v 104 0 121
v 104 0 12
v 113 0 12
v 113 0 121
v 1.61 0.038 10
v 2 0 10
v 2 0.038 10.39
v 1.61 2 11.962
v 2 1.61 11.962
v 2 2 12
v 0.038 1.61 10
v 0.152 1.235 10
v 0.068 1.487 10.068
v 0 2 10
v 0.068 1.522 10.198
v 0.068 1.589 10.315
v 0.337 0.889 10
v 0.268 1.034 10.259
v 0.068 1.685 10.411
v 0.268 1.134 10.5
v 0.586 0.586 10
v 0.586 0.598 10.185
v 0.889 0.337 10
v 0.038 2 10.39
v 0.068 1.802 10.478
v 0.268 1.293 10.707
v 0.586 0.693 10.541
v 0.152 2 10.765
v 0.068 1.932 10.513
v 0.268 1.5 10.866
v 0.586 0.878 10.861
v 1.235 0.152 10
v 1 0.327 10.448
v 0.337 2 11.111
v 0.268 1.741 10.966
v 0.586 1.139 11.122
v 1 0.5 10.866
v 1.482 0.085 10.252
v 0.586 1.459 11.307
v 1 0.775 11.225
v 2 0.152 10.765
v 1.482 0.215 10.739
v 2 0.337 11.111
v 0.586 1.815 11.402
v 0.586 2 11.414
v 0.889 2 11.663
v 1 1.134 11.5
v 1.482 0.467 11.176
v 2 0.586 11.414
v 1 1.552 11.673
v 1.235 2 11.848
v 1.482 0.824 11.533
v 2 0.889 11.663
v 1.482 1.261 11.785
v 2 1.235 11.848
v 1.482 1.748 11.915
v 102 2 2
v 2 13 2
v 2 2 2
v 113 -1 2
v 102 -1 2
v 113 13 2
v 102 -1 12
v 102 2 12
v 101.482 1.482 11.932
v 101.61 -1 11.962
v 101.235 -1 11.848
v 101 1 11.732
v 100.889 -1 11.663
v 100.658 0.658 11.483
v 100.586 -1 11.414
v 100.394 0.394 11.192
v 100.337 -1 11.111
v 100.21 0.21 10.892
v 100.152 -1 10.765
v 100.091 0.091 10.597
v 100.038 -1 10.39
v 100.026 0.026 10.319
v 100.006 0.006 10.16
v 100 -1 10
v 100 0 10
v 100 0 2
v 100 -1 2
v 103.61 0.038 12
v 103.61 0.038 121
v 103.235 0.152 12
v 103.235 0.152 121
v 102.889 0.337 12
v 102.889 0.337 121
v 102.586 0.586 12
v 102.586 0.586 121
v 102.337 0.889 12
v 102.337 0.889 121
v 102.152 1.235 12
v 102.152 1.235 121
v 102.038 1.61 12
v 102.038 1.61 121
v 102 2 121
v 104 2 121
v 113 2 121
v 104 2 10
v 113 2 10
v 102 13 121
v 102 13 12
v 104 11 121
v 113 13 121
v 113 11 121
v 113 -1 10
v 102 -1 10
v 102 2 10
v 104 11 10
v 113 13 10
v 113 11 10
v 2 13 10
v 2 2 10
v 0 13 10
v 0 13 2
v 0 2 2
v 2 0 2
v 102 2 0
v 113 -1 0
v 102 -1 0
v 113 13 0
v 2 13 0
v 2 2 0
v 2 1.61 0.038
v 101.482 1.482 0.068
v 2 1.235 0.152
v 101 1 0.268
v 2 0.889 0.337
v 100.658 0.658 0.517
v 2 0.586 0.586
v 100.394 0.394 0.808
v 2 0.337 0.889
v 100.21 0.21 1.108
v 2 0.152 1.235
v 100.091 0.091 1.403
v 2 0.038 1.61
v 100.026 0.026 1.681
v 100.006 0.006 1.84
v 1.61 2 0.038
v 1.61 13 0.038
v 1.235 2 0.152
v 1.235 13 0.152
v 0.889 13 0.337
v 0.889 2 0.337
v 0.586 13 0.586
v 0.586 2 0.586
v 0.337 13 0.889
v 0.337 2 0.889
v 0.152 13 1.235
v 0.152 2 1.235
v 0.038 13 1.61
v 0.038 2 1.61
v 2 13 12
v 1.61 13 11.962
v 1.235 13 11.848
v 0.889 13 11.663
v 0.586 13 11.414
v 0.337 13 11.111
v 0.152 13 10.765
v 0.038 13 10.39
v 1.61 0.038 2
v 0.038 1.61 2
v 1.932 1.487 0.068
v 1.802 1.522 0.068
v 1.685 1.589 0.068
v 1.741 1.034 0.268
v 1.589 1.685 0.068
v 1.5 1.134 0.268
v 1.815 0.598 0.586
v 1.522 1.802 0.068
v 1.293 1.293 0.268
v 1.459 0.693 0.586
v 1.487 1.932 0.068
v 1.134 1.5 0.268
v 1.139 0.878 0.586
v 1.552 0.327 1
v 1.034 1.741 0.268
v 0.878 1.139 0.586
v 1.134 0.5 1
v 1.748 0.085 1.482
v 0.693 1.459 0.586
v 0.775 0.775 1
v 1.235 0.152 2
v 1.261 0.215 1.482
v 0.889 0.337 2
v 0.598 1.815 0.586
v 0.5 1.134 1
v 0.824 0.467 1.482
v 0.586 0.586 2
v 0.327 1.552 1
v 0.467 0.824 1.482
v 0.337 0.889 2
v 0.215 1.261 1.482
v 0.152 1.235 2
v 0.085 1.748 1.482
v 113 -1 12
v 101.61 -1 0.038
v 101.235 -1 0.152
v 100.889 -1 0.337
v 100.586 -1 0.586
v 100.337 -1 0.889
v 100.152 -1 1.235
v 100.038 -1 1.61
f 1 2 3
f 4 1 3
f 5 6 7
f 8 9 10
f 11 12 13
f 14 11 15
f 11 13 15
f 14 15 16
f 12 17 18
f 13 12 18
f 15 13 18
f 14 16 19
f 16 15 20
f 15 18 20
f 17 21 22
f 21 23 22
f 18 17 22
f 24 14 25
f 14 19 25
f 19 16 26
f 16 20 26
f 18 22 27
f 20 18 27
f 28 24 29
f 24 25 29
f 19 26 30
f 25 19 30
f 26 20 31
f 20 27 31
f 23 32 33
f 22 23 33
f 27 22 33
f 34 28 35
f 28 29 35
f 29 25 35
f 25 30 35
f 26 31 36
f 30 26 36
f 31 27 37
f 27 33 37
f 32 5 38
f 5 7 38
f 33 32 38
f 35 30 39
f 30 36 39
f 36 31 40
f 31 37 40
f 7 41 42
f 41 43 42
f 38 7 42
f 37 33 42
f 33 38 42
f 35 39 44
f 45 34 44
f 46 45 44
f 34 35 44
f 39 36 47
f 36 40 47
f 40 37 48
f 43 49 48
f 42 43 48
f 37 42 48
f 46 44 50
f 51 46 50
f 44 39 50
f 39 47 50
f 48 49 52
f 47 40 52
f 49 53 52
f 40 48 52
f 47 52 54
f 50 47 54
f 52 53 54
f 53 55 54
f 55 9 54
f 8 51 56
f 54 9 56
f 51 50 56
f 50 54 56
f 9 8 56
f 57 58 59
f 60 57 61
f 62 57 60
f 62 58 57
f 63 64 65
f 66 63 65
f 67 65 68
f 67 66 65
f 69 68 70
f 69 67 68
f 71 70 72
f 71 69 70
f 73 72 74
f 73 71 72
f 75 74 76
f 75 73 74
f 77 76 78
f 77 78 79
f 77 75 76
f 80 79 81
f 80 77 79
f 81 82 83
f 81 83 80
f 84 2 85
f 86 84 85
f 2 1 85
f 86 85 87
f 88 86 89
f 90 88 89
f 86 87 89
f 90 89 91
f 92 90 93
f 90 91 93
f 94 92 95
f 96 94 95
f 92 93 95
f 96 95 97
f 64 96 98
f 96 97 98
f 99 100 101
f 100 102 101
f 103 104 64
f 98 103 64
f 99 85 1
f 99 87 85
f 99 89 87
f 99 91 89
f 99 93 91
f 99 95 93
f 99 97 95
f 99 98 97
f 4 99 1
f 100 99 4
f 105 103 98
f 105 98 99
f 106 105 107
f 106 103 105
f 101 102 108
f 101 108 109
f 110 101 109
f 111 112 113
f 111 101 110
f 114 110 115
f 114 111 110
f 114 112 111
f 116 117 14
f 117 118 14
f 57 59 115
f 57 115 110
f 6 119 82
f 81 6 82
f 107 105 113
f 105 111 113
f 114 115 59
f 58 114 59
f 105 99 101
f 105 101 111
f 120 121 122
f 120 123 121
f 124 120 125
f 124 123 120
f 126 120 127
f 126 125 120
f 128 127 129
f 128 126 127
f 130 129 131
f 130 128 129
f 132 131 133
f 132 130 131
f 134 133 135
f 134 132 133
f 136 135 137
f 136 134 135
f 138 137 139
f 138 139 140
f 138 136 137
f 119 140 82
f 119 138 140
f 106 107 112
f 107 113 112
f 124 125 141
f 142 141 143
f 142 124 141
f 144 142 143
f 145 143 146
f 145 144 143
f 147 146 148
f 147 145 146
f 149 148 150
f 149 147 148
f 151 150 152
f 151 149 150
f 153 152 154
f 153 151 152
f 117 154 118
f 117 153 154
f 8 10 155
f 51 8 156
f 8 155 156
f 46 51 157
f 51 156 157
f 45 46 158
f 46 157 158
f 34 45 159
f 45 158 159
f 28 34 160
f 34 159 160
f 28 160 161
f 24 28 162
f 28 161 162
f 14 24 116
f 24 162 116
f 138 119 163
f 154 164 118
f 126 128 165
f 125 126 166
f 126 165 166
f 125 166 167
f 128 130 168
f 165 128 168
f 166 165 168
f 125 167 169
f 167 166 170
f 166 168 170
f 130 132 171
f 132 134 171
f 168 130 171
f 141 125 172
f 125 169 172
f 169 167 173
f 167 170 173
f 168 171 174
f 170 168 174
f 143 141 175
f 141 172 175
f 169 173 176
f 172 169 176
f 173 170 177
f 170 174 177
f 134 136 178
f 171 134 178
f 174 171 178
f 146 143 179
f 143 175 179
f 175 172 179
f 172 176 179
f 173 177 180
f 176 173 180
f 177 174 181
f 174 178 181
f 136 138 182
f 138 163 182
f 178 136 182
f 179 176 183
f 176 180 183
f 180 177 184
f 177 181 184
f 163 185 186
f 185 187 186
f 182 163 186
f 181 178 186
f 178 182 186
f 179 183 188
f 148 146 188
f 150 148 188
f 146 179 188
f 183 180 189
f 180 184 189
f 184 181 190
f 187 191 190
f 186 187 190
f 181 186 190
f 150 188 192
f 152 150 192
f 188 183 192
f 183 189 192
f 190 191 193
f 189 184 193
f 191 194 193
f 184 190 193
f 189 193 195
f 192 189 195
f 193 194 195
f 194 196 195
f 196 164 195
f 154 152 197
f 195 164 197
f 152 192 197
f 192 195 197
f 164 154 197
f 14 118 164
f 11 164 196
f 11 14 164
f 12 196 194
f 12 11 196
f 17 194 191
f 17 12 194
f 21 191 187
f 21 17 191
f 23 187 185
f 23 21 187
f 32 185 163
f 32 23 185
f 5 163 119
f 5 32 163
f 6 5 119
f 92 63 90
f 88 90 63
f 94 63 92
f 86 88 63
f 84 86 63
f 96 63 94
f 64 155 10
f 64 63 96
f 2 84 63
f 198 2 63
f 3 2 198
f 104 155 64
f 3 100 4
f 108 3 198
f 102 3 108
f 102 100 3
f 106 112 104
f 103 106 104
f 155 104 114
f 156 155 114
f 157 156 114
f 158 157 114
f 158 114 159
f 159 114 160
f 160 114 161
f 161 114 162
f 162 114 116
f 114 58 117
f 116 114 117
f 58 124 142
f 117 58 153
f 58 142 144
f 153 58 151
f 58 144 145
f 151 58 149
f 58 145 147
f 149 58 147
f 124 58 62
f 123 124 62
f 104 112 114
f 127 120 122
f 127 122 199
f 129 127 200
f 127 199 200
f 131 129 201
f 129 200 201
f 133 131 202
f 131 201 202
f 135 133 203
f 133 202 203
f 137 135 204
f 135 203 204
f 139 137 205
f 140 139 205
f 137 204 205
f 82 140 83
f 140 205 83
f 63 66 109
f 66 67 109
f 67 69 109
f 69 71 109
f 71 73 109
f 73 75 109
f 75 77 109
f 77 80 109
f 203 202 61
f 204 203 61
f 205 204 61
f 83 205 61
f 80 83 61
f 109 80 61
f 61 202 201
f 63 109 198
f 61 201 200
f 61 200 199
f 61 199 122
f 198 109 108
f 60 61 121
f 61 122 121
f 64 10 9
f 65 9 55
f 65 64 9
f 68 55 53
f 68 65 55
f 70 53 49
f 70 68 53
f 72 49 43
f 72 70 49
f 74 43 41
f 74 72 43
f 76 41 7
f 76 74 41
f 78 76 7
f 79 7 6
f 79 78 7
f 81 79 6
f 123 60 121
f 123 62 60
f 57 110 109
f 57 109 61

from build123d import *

# Parameters (mm, degrees)
BOSS_EXTRUDE1_DEPTH = 2
BOSS_EXTRUDE2_DEPTH = 11
SKETCH3_W           = 9
SKETCH3_H           = 9
CUT_EXTRUDE1_DEPTH  = 2
BOSS_EXTRUDE3_DEPTH = 109
BOSS_EXTRUDE4_DEPTH = 1
FILLET1_R           = 2


with BuildPart() as part:
    # Sketch1 → Boss-Extrude1 (new body)
    with BuildSketch(Plane(origin=(0, 0, 0), x_dir=(1, 0, 0), z_dir=(0, 1, 0))):
        Polygon((0, 0), (0, -12), (113, -12), (113, -10), (102, -10), (102, -2), (113, -2), (113, 0), align=None)
    extrude(amount=BOSS_EXTRUDE1_DEPTH)

    # Sketch2 → Boss-Extrude2 (add)
    with BuildSketch(Plane(origin=(0, 2, 0), x_dir=(1, 0, 0), z_dir=(0, 1, 0))):
        Polygon((2, -10), (2, -2), (102, -2), (113, -2), (113, 0), (0, 0), (0, -12), (113, -12), (113, -10), (102, -10), align=None)
    extrude(amount=BOSS_EXTRUDE2_DEPTH)

    # Sketch3 → Cut-Extrude1 (cut)
    with BuildSketch(Plane.XY.offset(12)):
        with Locations((108.5, 6.5)):
            Rectangle(SKETCH3_W, SKETCH3_H)
    extrude(amount=-CUT_EXTRUDE1_DEPTH, mode=Mode.SUBTRACT)

    # Sketch3<3> → Boss-Extrude3 (add)
    with BuildSketch(Plane.XY.offset(12)):
        Polygon((113, 0), (113, 2), (104, 2), (104, 11), (113, 11), (113, 13), (102, 13), (102, 0), align=None)
    extrude(amount=BOSS_EXTRUDE3_DEPTH)

    # Sketch1<3> → Boss-Extrude4 (add)
    with BuildSketch(Plane(origin=(0, 0, 0), x_dir=(1, 0, 0), z_dir=(0, 1, 0))):
        Polygon((113, 0), (100, 0), (100, -12), (113, -12), (113, -10), (102, -10), (102, -2), (113, -2), align=None)
    extrude(amount=-BOSS_EXTRUDE4_DEPTH)

    # Fillet1
    fillet1_edges = [part.edges().sort_by_distance(p)[0] for p in [
        (100, -0.5, 0),
        (50, 0, 12),
        (0, 0, 6),
        (50, 0, 0),
        (0, 6.5, 12),
        (0, 6.5, 0),
        (102, 0, 66.5),
        (100, -0.5, 12),
    ]]
    fillet(fillet1_edges, radius=FILLET1_R - 0.0001)  # a hair under: the kernel refuses the full size


solid = part.part
